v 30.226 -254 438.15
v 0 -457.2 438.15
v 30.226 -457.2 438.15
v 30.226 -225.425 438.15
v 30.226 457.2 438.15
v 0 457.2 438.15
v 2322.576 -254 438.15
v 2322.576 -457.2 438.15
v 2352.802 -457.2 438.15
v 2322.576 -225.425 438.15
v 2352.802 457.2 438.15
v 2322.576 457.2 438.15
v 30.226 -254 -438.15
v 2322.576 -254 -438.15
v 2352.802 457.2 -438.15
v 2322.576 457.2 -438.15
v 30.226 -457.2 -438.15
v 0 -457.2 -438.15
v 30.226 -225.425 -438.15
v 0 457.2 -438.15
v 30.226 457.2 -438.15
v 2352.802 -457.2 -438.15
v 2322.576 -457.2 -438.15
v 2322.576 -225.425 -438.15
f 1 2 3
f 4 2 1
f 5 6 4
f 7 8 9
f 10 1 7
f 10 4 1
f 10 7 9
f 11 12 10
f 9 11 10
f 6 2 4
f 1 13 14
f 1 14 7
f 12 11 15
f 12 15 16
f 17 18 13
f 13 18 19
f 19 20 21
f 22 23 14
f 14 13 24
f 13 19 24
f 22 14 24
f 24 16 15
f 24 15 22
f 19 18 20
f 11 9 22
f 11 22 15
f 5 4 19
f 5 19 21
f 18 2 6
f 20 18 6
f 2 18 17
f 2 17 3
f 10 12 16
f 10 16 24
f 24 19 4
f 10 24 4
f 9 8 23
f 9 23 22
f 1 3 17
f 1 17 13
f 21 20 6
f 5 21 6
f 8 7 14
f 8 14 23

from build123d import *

# Parameters (mm, degrees)
F0_W     = 914.4
F0_H     = 876.3
F1_DEPTH = 30.226
F2_W     = 28.575
F2_H     = 876.3
F3_DEPTH = 2292.35
F5_DEPTH = 876.3


with BuildPart() as f1:
    # F0 (on Right) → F1 (new body)
    with BuildSketch(Plane.YZ):
        Rectangle(F0_W, F0_H)
    extrude(amount=F1_DEPTH)

    # F2 (on face) → F3 (join)
    with BuildSketch(Plane.YZ.offset(30.226)):
        with Locations((-239.7125, 0)):
            Rectangle(F2_W, F2_H)
    extrude(amount=F3_DEPTH)

    # F4 (on face) → F5 (join)
    with BuildSketch(Plane.XY.offset(438.15)):
        Polygon((2322.576, -225.425), (2322.576, -254), (2322.576, -457.2), (2352.802, -457.2), (2352.802, 457.2), (2322.576, 457.2), align=None)
    extrude(amount=-F5_DEPTH)


solid = f1.part
